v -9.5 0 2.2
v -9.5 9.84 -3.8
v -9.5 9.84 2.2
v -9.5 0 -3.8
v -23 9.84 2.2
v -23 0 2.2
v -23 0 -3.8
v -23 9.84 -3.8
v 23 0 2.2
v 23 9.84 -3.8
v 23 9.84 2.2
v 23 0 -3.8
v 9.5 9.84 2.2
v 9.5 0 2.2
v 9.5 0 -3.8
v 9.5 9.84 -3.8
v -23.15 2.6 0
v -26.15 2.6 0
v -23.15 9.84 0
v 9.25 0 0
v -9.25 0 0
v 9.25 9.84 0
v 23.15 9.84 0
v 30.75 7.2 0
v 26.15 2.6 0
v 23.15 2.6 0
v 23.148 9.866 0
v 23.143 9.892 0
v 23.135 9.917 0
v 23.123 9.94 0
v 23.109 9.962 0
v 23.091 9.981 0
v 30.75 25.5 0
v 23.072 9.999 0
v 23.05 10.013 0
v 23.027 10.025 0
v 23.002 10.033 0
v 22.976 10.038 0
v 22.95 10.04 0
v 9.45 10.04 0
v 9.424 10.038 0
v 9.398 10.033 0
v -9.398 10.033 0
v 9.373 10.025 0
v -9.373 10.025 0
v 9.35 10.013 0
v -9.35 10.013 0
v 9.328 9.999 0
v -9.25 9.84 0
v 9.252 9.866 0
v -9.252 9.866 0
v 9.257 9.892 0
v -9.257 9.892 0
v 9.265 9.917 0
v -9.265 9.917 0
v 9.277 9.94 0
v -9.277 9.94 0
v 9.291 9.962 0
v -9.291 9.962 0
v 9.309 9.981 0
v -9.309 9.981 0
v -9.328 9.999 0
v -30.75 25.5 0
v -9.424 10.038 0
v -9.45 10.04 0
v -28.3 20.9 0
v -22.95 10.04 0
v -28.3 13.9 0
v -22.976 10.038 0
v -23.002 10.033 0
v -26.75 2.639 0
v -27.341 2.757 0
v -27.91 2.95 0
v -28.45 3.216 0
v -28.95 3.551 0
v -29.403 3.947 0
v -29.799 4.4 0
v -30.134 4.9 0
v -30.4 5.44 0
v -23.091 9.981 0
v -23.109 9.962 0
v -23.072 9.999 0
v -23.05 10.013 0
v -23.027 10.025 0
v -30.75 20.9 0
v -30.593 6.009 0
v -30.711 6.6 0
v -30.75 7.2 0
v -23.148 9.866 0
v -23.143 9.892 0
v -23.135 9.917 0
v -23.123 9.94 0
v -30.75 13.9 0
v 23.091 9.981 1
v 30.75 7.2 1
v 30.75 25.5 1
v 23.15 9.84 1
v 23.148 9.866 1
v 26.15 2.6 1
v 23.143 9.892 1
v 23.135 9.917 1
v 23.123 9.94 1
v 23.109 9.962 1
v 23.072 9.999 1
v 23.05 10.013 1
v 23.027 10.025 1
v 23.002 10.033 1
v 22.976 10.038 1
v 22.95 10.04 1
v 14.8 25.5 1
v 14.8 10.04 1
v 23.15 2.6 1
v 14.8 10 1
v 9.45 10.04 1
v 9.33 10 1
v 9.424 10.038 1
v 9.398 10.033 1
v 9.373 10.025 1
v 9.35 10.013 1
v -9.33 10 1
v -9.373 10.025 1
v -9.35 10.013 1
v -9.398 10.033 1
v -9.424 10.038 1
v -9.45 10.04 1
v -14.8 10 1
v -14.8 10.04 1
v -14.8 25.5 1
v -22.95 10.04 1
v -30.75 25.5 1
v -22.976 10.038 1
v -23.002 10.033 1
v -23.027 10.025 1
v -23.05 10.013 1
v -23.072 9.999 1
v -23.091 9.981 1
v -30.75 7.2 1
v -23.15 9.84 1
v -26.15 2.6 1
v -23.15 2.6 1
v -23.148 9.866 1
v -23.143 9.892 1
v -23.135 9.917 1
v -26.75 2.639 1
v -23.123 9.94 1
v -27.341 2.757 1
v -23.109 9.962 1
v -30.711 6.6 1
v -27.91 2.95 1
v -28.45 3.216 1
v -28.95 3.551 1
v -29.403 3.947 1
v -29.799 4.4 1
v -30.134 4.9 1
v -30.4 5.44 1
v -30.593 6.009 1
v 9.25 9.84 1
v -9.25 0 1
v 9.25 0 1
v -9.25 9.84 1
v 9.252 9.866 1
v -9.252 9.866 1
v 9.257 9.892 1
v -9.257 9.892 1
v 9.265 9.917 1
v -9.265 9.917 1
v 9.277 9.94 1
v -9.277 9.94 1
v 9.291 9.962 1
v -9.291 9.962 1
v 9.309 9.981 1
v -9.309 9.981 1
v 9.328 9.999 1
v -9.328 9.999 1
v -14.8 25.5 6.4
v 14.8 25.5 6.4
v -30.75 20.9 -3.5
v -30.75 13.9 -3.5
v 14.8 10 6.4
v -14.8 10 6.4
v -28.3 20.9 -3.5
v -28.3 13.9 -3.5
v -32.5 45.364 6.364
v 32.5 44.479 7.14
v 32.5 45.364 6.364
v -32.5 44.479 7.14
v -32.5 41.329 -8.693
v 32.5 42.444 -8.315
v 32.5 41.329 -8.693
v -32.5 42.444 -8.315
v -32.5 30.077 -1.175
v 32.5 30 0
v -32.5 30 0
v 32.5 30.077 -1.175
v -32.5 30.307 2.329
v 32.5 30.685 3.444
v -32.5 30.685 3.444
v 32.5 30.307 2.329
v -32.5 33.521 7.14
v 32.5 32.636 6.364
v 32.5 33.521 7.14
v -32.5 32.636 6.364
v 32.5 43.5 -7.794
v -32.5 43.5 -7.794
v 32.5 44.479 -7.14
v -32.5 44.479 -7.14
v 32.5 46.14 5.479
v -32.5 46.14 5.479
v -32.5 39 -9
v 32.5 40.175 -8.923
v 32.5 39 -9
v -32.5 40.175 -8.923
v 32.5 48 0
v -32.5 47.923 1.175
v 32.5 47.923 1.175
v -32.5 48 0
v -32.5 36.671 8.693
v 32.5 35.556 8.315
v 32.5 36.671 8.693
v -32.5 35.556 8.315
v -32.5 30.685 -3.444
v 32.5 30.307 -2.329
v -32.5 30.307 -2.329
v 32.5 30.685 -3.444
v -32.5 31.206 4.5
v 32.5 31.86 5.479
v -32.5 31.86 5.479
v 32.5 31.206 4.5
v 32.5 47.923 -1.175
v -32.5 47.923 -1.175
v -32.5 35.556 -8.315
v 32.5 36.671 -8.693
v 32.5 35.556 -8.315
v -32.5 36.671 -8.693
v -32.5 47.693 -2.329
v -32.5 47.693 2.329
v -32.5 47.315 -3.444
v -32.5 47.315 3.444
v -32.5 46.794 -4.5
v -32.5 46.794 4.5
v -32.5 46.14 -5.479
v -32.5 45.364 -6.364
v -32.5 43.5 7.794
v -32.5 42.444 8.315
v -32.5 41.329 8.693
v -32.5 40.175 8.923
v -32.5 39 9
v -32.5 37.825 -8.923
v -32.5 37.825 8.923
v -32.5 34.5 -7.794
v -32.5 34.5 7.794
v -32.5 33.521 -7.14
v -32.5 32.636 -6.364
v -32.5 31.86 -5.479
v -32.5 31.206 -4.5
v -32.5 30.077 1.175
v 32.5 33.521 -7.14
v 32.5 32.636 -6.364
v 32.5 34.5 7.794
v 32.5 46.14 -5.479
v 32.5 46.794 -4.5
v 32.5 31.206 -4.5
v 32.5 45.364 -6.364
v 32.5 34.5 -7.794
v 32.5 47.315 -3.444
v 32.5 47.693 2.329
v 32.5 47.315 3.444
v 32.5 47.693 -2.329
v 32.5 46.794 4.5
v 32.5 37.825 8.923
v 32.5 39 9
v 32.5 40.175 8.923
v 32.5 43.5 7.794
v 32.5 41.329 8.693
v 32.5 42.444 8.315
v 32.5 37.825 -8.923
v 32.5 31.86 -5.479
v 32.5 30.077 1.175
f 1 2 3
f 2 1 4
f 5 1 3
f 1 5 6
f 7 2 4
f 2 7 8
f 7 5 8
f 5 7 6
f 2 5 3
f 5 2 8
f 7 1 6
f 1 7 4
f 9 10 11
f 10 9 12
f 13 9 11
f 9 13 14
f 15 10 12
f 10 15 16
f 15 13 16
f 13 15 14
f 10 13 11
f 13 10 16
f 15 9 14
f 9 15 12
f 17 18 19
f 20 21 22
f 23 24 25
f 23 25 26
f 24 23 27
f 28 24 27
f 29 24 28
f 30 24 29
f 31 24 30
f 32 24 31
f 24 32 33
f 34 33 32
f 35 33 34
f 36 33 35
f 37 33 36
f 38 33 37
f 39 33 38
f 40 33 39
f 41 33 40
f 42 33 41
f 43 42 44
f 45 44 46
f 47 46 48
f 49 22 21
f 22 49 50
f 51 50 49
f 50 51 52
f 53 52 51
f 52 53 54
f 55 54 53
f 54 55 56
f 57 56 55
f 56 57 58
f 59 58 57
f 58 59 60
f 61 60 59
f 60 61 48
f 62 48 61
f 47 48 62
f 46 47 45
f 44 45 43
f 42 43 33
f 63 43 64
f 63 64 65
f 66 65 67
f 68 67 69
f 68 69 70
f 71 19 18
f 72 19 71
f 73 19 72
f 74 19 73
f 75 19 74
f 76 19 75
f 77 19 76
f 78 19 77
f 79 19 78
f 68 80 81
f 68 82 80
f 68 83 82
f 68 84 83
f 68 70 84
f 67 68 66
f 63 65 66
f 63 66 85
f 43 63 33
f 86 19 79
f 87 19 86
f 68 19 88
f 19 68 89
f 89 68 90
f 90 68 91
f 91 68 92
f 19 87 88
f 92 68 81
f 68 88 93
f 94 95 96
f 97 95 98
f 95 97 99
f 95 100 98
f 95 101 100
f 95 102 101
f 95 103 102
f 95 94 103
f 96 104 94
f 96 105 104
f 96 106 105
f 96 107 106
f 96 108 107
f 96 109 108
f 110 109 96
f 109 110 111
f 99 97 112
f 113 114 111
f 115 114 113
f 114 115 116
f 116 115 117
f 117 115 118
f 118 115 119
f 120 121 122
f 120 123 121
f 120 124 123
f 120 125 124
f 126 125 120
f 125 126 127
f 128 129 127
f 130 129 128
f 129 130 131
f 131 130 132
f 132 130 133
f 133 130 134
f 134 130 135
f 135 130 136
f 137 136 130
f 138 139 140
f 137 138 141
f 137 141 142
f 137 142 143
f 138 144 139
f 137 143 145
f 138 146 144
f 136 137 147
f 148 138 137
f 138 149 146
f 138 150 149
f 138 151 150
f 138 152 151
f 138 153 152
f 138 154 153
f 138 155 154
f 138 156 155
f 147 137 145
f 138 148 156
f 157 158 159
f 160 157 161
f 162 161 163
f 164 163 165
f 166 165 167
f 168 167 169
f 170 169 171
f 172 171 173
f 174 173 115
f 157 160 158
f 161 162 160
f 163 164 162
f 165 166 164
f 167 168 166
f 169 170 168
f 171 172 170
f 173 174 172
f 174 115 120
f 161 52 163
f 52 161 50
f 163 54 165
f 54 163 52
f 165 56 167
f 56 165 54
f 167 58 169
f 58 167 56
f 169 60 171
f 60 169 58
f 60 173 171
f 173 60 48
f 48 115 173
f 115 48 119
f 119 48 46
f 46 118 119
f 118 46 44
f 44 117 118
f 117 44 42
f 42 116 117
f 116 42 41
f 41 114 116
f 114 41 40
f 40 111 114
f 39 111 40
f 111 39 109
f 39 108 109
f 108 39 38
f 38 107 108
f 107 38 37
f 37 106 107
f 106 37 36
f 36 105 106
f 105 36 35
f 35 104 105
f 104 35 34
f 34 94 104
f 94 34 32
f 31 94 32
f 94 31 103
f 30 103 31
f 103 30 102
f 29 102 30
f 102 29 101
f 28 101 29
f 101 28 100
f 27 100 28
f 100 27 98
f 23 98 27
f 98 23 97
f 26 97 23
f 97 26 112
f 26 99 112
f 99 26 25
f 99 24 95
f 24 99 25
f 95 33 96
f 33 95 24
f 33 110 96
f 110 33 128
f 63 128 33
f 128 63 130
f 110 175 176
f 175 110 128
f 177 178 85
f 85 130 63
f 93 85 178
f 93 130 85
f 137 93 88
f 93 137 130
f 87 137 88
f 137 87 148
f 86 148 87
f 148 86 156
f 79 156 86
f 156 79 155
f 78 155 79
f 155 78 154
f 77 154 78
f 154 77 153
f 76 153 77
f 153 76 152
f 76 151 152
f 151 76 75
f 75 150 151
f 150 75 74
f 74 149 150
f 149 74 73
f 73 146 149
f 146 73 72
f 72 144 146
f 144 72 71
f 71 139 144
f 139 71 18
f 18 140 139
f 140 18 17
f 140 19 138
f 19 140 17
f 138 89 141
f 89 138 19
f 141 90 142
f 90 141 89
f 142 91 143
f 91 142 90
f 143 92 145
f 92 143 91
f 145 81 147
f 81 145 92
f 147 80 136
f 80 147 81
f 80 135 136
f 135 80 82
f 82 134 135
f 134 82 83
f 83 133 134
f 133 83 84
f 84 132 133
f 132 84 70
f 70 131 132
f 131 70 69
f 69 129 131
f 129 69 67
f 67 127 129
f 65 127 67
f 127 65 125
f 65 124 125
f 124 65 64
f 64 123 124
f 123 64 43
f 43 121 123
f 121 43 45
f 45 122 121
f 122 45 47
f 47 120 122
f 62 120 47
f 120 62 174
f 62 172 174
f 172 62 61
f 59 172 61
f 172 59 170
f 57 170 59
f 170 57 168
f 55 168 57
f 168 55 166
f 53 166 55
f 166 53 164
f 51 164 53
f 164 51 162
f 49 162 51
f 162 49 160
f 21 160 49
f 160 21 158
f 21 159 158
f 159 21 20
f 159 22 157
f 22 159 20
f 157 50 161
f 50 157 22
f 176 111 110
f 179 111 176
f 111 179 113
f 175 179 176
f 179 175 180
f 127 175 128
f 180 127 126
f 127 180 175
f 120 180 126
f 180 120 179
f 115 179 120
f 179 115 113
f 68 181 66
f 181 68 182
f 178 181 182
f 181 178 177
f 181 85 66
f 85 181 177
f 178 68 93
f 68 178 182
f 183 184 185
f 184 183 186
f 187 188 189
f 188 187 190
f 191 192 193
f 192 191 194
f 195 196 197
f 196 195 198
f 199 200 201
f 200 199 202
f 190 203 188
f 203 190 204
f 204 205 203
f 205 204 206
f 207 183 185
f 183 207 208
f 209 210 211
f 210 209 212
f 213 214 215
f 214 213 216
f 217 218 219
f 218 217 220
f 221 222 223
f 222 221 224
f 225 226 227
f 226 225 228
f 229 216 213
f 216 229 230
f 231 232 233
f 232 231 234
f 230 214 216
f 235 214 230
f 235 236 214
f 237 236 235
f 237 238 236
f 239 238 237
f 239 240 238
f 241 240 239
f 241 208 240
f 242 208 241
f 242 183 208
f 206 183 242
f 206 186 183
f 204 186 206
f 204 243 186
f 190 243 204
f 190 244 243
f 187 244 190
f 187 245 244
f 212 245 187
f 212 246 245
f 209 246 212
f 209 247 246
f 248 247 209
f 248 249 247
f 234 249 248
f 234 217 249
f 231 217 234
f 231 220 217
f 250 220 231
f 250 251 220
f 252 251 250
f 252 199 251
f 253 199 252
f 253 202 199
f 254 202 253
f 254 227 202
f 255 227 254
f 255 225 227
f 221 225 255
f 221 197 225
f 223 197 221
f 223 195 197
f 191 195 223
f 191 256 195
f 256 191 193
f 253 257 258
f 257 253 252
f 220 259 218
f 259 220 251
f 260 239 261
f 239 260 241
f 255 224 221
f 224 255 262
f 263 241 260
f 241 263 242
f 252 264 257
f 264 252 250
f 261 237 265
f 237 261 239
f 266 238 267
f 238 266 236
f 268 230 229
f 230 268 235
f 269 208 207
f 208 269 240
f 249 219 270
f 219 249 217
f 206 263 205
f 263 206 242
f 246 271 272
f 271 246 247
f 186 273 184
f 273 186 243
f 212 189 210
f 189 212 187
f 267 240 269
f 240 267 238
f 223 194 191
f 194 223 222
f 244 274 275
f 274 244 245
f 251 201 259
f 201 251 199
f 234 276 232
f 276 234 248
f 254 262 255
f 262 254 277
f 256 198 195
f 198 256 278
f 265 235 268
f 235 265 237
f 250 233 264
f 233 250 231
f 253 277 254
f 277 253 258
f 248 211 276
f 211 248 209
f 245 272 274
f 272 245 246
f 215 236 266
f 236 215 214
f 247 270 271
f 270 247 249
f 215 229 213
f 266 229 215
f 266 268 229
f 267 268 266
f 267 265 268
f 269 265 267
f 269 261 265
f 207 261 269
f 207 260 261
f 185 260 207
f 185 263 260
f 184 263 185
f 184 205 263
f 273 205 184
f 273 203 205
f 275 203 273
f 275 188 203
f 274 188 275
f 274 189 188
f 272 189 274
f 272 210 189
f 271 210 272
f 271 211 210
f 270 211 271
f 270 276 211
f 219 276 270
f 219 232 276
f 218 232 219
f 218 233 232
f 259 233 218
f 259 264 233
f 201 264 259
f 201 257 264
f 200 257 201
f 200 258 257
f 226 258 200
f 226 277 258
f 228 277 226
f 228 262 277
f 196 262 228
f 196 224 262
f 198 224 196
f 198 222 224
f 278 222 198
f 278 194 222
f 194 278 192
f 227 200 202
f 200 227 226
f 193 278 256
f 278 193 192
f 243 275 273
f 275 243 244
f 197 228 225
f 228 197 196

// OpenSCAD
$fn=48;
pcb22W_TFT();

translate([0,39,0]) rotate([0,90,0]) cylinder(d=18,h=65,center=true);

module pcb22W_TFT(){
// 22.5W charger module with color TFT display
// https://de.aliexpress.com/item/1005009524999358.html
  pcbDims=[61.5,25.5,1];
  pcbSitesHght=22.9;
  pcbCntrWidth=18.5;
  crnrRad=4.6;
  usbADist=32.5;
  usbADims=[13.5,9.84,6];
  usbAZOffset=1.2;
  displayDims=[29.6,15.5,5.4];
  btnDims=[2.45,7,3.5];
  btnPos=[-(pcbDims.x-btnDims.x)/2,pcbDims.y-8.1,-btnDims.z/2];
  
  sitesYOffset=pcbDims.y-pcbSitesHght+crnrRad;
  color("darkGreen") 
    linear_extrude(pcbDims.z) translate([-pcbDims.x/2,0]) difference(){
      union(){
        translate([0,sitesYOffset]) square([pcbDims.x,pcbSitesHght-crnrRad]);
        translate([crnrRad,sitesYOffset]) circle(crnrRad);
        translate([crnrRad,sitesYOffset-crnrRad]) square([pcbDims.x-crnrRad*2,crnrRad]);
        translate([pcbDims.x-crnrRad,sitesYOffset]) circle(crnrRad,$fn=4);
        translate([(pcbDims.x-pcbCntrWidth)/2,0]) square([pcbCntrWidth,pcbDims.y]);
      }
      for (ix=[-1,1])
        translate([pcbDims.x/2+ix*(pcbCntrWidth+usbADims.x+0.4)/2,usbADims.y/2]) offset(0.2) 
          square([usbADims.x,usbADims.y],true);
    }
  //USB-A sockets
  for (ix=[-1,1])
    translate([ix*usbADist/2,usbADims.y/2,-usbADims.z/2+pcbDims.z+usbAZOffset]) cube(usbADims,true);
  //display
  translate([0,pcbDims.y-displayDims.y/2,pcbDims.z+displayDims.z/2]) cube(displayDims,true);
  //button
  translate(btnPos) cube(btnDims,true);
}
